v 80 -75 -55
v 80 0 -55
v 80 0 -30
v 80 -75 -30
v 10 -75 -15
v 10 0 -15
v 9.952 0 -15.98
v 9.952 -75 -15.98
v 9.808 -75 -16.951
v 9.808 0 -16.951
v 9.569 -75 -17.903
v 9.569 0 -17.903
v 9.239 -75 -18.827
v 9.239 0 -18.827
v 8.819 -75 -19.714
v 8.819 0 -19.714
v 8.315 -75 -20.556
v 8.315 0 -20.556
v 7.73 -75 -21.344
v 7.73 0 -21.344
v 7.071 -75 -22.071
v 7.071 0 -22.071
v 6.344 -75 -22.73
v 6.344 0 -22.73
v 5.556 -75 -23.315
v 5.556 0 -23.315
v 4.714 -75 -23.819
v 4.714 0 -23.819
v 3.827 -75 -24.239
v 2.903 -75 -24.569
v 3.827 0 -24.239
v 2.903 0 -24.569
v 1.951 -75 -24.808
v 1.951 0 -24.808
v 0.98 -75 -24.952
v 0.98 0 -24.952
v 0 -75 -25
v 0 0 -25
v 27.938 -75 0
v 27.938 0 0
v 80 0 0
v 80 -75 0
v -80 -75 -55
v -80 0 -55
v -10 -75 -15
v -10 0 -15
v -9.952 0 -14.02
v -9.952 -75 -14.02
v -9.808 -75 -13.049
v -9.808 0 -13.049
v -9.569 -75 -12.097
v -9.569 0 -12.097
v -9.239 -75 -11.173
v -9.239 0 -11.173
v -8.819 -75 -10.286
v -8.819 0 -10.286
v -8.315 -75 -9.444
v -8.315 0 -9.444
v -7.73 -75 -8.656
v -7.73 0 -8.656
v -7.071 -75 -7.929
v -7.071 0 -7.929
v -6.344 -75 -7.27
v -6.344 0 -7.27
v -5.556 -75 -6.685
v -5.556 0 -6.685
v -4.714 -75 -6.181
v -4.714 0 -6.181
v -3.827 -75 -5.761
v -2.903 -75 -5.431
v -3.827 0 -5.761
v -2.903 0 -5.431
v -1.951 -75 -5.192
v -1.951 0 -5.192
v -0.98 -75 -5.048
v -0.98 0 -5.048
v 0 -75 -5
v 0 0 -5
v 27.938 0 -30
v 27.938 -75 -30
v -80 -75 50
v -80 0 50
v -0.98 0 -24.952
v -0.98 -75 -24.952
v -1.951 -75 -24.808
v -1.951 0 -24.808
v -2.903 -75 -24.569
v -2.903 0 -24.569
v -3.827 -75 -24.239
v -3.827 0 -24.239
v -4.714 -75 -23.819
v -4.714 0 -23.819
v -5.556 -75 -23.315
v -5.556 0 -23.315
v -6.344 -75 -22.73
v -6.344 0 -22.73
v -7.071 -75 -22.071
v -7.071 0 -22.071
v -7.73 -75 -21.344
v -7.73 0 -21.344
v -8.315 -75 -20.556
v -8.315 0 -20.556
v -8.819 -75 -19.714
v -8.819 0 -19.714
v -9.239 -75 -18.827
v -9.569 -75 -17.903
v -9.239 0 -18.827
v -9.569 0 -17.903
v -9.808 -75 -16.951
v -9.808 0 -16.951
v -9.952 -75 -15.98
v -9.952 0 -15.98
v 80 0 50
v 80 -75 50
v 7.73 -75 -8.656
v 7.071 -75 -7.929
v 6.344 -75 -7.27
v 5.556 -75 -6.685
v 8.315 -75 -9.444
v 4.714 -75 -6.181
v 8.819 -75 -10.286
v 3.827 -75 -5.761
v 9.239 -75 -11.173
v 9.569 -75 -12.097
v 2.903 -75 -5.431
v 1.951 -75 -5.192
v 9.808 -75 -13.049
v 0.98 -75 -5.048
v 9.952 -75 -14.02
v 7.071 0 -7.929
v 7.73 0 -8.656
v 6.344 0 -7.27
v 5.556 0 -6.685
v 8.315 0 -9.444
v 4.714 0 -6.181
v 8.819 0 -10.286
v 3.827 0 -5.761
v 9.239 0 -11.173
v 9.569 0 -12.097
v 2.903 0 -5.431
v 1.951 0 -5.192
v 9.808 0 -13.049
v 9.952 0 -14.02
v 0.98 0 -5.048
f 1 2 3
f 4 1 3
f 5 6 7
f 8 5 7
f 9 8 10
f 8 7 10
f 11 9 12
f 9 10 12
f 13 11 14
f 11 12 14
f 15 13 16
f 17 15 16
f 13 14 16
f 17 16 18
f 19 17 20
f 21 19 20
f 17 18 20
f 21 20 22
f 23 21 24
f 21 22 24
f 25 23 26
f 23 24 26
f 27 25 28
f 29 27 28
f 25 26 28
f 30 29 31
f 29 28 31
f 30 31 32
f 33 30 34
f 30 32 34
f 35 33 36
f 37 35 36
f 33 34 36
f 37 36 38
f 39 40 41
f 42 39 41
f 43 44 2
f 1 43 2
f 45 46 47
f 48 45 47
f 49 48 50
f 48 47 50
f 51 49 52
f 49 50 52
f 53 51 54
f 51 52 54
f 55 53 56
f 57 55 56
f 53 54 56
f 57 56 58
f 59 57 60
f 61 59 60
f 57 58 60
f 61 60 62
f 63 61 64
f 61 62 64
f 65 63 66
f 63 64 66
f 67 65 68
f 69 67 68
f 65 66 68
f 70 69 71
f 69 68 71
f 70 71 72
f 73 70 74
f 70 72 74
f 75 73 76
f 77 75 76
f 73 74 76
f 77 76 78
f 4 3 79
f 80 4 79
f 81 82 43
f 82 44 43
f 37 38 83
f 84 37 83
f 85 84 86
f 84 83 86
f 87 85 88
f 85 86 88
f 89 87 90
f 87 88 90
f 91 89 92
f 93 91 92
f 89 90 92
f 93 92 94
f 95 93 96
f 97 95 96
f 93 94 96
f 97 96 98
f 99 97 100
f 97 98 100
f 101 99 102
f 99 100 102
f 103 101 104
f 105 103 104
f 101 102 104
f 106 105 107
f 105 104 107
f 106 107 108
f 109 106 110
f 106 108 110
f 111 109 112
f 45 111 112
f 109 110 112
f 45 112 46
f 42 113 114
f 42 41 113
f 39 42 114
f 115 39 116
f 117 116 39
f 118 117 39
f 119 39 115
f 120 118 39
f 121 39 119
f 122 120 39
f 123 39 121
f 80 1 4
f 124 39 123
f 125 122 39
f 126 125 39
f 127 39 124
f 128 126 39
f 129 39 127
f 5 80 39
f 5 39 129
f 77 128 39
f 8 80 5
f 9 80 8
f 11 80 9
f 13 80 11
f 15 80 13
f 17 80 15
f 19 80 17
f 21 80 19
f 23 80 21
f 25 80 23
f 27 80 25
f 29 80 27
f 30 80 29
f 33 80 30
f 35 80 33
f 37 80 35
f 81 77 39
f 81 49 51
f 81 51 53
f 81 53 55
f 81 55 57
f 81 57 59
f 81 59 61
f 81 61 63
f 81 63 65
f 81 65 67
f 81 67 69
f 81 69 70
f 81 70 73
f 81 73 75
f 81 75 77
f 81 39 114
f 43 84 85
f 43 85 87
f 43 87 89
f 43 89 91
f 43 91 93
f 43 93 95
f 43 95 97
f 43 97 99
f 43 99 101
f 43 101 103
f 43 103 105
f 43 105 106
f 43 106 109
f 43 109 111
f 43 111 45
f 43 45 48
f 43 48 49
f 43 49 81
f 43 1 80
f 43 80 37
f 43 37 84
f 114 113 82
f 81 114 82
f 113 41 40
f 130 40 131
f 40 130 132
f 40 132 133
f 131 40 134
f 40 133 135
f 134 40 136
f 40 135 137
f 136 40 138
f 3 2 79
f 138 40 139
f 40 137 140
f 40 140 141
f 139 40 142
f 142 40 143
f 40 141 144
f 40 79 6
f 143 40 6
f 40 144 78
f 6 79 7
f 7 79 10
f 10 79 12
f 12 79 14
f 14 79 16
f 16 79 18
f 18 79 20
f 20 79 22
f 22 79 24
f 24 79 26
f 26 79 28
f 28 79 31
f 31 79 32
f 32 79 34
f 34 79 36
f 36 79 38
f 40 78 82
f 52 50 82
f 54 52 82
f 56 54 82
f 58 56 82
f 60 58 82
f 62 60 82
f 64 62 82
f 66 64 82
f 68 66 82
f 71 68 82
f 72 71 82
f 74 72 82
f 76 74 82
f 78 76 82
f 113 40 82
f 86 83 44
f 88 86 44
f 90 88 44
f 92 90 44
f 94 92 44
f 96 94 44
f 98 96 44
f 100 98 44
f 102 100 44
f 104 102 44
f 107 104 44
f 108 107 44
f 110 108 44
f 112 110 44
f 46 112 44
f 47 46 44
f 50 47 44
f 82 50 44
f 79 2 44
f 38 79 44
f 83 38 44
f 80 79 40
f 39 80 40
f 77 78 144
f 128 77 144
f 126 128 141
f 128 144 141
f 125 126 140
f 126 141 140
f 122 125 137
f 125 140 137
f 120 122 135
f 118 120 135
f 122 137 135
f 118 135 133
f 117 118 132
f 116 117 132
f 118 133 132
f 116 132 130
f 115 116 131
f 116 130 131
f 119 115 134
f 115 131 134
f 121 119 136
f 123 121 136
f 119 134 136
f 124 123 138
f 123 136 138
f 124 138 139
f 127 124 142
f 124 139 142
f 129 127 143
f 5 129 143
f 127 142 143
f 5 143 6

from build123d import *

# Parameters (mm, degrees)
F0_W     = 63
F0_H     = 40
F1_DEPTH = 75
F2_DEPTH = 25


with BuildPart() as f1:
    # F0 (on Front) → F1 (new body)
    with BuildSketch(Plane.XZ):
        with Locations((-48.5, 5)):
            Rectangle(F0_W, F0_H)
        Polygon((80, 25), (17, 25), (17, -15), (27.937743758, -15), (27.937743758, 0), (80, 0), align=None)
        with BuildLine():
            Line((17, 25), (0, 25))
            Line((0, 25), (0, -5))
            ThreePointArc((0, -5), (7.0710678119, -7.9289321881), (10, -15))
            Line((10, -15), (17, -15))
            Line((17, -15), (17, 25))
        make_face()
        with BuildLine():
            Line((0, 25), (-17, 25))
            Line((-17, 25), (-17, -15))
            Line((-17, -15), (-10, -15))
            ThreePointArc((-10, -15), (-7.0710678119, -7.9289321881), (0, -5))
            Line((0, -5), (0, 25))
        make_face()
        with Locations((-48.5, -35)):
            Rectangle(F0_W, F0_H)
        Polygon((27.937743758, -15), (17, -15), (17, -55), (80, -55), (80, -30), (27.937743758, -30), align=None)
        with BuildLine():
            Line((-10, -15), (-17, -15))
            Line((-17, -15), (-17, -55))
            Line((-17, -55), (0, -55))
            Line((0, -55), (0, -25))
            ThreePointArc((0, -25), (-7.0710678119, -22.0710678119), (-10, -15))
        make_face()
        with BuildLine():
            Line((17, -55), (17, -15))
            Line((17, -15), (10, -15))
            ThreePointArc((10, -15), (7.0710678119, -22.0710678119), (0, -25))
            Line((0, -25), (0, -55))
            Line((0, -55), (17, -55))
        make_face()
    extrude(amount=F1_DEPTH)

    # F2 (add): a face of the model
    f2_faces = [f1.faces().sort_by_distance(p)[0] for p in [
        (0, -37.5, 25),
    ]]
    extrude(f2_faces, amount=F2_DEPTH)


solid = f1.part
